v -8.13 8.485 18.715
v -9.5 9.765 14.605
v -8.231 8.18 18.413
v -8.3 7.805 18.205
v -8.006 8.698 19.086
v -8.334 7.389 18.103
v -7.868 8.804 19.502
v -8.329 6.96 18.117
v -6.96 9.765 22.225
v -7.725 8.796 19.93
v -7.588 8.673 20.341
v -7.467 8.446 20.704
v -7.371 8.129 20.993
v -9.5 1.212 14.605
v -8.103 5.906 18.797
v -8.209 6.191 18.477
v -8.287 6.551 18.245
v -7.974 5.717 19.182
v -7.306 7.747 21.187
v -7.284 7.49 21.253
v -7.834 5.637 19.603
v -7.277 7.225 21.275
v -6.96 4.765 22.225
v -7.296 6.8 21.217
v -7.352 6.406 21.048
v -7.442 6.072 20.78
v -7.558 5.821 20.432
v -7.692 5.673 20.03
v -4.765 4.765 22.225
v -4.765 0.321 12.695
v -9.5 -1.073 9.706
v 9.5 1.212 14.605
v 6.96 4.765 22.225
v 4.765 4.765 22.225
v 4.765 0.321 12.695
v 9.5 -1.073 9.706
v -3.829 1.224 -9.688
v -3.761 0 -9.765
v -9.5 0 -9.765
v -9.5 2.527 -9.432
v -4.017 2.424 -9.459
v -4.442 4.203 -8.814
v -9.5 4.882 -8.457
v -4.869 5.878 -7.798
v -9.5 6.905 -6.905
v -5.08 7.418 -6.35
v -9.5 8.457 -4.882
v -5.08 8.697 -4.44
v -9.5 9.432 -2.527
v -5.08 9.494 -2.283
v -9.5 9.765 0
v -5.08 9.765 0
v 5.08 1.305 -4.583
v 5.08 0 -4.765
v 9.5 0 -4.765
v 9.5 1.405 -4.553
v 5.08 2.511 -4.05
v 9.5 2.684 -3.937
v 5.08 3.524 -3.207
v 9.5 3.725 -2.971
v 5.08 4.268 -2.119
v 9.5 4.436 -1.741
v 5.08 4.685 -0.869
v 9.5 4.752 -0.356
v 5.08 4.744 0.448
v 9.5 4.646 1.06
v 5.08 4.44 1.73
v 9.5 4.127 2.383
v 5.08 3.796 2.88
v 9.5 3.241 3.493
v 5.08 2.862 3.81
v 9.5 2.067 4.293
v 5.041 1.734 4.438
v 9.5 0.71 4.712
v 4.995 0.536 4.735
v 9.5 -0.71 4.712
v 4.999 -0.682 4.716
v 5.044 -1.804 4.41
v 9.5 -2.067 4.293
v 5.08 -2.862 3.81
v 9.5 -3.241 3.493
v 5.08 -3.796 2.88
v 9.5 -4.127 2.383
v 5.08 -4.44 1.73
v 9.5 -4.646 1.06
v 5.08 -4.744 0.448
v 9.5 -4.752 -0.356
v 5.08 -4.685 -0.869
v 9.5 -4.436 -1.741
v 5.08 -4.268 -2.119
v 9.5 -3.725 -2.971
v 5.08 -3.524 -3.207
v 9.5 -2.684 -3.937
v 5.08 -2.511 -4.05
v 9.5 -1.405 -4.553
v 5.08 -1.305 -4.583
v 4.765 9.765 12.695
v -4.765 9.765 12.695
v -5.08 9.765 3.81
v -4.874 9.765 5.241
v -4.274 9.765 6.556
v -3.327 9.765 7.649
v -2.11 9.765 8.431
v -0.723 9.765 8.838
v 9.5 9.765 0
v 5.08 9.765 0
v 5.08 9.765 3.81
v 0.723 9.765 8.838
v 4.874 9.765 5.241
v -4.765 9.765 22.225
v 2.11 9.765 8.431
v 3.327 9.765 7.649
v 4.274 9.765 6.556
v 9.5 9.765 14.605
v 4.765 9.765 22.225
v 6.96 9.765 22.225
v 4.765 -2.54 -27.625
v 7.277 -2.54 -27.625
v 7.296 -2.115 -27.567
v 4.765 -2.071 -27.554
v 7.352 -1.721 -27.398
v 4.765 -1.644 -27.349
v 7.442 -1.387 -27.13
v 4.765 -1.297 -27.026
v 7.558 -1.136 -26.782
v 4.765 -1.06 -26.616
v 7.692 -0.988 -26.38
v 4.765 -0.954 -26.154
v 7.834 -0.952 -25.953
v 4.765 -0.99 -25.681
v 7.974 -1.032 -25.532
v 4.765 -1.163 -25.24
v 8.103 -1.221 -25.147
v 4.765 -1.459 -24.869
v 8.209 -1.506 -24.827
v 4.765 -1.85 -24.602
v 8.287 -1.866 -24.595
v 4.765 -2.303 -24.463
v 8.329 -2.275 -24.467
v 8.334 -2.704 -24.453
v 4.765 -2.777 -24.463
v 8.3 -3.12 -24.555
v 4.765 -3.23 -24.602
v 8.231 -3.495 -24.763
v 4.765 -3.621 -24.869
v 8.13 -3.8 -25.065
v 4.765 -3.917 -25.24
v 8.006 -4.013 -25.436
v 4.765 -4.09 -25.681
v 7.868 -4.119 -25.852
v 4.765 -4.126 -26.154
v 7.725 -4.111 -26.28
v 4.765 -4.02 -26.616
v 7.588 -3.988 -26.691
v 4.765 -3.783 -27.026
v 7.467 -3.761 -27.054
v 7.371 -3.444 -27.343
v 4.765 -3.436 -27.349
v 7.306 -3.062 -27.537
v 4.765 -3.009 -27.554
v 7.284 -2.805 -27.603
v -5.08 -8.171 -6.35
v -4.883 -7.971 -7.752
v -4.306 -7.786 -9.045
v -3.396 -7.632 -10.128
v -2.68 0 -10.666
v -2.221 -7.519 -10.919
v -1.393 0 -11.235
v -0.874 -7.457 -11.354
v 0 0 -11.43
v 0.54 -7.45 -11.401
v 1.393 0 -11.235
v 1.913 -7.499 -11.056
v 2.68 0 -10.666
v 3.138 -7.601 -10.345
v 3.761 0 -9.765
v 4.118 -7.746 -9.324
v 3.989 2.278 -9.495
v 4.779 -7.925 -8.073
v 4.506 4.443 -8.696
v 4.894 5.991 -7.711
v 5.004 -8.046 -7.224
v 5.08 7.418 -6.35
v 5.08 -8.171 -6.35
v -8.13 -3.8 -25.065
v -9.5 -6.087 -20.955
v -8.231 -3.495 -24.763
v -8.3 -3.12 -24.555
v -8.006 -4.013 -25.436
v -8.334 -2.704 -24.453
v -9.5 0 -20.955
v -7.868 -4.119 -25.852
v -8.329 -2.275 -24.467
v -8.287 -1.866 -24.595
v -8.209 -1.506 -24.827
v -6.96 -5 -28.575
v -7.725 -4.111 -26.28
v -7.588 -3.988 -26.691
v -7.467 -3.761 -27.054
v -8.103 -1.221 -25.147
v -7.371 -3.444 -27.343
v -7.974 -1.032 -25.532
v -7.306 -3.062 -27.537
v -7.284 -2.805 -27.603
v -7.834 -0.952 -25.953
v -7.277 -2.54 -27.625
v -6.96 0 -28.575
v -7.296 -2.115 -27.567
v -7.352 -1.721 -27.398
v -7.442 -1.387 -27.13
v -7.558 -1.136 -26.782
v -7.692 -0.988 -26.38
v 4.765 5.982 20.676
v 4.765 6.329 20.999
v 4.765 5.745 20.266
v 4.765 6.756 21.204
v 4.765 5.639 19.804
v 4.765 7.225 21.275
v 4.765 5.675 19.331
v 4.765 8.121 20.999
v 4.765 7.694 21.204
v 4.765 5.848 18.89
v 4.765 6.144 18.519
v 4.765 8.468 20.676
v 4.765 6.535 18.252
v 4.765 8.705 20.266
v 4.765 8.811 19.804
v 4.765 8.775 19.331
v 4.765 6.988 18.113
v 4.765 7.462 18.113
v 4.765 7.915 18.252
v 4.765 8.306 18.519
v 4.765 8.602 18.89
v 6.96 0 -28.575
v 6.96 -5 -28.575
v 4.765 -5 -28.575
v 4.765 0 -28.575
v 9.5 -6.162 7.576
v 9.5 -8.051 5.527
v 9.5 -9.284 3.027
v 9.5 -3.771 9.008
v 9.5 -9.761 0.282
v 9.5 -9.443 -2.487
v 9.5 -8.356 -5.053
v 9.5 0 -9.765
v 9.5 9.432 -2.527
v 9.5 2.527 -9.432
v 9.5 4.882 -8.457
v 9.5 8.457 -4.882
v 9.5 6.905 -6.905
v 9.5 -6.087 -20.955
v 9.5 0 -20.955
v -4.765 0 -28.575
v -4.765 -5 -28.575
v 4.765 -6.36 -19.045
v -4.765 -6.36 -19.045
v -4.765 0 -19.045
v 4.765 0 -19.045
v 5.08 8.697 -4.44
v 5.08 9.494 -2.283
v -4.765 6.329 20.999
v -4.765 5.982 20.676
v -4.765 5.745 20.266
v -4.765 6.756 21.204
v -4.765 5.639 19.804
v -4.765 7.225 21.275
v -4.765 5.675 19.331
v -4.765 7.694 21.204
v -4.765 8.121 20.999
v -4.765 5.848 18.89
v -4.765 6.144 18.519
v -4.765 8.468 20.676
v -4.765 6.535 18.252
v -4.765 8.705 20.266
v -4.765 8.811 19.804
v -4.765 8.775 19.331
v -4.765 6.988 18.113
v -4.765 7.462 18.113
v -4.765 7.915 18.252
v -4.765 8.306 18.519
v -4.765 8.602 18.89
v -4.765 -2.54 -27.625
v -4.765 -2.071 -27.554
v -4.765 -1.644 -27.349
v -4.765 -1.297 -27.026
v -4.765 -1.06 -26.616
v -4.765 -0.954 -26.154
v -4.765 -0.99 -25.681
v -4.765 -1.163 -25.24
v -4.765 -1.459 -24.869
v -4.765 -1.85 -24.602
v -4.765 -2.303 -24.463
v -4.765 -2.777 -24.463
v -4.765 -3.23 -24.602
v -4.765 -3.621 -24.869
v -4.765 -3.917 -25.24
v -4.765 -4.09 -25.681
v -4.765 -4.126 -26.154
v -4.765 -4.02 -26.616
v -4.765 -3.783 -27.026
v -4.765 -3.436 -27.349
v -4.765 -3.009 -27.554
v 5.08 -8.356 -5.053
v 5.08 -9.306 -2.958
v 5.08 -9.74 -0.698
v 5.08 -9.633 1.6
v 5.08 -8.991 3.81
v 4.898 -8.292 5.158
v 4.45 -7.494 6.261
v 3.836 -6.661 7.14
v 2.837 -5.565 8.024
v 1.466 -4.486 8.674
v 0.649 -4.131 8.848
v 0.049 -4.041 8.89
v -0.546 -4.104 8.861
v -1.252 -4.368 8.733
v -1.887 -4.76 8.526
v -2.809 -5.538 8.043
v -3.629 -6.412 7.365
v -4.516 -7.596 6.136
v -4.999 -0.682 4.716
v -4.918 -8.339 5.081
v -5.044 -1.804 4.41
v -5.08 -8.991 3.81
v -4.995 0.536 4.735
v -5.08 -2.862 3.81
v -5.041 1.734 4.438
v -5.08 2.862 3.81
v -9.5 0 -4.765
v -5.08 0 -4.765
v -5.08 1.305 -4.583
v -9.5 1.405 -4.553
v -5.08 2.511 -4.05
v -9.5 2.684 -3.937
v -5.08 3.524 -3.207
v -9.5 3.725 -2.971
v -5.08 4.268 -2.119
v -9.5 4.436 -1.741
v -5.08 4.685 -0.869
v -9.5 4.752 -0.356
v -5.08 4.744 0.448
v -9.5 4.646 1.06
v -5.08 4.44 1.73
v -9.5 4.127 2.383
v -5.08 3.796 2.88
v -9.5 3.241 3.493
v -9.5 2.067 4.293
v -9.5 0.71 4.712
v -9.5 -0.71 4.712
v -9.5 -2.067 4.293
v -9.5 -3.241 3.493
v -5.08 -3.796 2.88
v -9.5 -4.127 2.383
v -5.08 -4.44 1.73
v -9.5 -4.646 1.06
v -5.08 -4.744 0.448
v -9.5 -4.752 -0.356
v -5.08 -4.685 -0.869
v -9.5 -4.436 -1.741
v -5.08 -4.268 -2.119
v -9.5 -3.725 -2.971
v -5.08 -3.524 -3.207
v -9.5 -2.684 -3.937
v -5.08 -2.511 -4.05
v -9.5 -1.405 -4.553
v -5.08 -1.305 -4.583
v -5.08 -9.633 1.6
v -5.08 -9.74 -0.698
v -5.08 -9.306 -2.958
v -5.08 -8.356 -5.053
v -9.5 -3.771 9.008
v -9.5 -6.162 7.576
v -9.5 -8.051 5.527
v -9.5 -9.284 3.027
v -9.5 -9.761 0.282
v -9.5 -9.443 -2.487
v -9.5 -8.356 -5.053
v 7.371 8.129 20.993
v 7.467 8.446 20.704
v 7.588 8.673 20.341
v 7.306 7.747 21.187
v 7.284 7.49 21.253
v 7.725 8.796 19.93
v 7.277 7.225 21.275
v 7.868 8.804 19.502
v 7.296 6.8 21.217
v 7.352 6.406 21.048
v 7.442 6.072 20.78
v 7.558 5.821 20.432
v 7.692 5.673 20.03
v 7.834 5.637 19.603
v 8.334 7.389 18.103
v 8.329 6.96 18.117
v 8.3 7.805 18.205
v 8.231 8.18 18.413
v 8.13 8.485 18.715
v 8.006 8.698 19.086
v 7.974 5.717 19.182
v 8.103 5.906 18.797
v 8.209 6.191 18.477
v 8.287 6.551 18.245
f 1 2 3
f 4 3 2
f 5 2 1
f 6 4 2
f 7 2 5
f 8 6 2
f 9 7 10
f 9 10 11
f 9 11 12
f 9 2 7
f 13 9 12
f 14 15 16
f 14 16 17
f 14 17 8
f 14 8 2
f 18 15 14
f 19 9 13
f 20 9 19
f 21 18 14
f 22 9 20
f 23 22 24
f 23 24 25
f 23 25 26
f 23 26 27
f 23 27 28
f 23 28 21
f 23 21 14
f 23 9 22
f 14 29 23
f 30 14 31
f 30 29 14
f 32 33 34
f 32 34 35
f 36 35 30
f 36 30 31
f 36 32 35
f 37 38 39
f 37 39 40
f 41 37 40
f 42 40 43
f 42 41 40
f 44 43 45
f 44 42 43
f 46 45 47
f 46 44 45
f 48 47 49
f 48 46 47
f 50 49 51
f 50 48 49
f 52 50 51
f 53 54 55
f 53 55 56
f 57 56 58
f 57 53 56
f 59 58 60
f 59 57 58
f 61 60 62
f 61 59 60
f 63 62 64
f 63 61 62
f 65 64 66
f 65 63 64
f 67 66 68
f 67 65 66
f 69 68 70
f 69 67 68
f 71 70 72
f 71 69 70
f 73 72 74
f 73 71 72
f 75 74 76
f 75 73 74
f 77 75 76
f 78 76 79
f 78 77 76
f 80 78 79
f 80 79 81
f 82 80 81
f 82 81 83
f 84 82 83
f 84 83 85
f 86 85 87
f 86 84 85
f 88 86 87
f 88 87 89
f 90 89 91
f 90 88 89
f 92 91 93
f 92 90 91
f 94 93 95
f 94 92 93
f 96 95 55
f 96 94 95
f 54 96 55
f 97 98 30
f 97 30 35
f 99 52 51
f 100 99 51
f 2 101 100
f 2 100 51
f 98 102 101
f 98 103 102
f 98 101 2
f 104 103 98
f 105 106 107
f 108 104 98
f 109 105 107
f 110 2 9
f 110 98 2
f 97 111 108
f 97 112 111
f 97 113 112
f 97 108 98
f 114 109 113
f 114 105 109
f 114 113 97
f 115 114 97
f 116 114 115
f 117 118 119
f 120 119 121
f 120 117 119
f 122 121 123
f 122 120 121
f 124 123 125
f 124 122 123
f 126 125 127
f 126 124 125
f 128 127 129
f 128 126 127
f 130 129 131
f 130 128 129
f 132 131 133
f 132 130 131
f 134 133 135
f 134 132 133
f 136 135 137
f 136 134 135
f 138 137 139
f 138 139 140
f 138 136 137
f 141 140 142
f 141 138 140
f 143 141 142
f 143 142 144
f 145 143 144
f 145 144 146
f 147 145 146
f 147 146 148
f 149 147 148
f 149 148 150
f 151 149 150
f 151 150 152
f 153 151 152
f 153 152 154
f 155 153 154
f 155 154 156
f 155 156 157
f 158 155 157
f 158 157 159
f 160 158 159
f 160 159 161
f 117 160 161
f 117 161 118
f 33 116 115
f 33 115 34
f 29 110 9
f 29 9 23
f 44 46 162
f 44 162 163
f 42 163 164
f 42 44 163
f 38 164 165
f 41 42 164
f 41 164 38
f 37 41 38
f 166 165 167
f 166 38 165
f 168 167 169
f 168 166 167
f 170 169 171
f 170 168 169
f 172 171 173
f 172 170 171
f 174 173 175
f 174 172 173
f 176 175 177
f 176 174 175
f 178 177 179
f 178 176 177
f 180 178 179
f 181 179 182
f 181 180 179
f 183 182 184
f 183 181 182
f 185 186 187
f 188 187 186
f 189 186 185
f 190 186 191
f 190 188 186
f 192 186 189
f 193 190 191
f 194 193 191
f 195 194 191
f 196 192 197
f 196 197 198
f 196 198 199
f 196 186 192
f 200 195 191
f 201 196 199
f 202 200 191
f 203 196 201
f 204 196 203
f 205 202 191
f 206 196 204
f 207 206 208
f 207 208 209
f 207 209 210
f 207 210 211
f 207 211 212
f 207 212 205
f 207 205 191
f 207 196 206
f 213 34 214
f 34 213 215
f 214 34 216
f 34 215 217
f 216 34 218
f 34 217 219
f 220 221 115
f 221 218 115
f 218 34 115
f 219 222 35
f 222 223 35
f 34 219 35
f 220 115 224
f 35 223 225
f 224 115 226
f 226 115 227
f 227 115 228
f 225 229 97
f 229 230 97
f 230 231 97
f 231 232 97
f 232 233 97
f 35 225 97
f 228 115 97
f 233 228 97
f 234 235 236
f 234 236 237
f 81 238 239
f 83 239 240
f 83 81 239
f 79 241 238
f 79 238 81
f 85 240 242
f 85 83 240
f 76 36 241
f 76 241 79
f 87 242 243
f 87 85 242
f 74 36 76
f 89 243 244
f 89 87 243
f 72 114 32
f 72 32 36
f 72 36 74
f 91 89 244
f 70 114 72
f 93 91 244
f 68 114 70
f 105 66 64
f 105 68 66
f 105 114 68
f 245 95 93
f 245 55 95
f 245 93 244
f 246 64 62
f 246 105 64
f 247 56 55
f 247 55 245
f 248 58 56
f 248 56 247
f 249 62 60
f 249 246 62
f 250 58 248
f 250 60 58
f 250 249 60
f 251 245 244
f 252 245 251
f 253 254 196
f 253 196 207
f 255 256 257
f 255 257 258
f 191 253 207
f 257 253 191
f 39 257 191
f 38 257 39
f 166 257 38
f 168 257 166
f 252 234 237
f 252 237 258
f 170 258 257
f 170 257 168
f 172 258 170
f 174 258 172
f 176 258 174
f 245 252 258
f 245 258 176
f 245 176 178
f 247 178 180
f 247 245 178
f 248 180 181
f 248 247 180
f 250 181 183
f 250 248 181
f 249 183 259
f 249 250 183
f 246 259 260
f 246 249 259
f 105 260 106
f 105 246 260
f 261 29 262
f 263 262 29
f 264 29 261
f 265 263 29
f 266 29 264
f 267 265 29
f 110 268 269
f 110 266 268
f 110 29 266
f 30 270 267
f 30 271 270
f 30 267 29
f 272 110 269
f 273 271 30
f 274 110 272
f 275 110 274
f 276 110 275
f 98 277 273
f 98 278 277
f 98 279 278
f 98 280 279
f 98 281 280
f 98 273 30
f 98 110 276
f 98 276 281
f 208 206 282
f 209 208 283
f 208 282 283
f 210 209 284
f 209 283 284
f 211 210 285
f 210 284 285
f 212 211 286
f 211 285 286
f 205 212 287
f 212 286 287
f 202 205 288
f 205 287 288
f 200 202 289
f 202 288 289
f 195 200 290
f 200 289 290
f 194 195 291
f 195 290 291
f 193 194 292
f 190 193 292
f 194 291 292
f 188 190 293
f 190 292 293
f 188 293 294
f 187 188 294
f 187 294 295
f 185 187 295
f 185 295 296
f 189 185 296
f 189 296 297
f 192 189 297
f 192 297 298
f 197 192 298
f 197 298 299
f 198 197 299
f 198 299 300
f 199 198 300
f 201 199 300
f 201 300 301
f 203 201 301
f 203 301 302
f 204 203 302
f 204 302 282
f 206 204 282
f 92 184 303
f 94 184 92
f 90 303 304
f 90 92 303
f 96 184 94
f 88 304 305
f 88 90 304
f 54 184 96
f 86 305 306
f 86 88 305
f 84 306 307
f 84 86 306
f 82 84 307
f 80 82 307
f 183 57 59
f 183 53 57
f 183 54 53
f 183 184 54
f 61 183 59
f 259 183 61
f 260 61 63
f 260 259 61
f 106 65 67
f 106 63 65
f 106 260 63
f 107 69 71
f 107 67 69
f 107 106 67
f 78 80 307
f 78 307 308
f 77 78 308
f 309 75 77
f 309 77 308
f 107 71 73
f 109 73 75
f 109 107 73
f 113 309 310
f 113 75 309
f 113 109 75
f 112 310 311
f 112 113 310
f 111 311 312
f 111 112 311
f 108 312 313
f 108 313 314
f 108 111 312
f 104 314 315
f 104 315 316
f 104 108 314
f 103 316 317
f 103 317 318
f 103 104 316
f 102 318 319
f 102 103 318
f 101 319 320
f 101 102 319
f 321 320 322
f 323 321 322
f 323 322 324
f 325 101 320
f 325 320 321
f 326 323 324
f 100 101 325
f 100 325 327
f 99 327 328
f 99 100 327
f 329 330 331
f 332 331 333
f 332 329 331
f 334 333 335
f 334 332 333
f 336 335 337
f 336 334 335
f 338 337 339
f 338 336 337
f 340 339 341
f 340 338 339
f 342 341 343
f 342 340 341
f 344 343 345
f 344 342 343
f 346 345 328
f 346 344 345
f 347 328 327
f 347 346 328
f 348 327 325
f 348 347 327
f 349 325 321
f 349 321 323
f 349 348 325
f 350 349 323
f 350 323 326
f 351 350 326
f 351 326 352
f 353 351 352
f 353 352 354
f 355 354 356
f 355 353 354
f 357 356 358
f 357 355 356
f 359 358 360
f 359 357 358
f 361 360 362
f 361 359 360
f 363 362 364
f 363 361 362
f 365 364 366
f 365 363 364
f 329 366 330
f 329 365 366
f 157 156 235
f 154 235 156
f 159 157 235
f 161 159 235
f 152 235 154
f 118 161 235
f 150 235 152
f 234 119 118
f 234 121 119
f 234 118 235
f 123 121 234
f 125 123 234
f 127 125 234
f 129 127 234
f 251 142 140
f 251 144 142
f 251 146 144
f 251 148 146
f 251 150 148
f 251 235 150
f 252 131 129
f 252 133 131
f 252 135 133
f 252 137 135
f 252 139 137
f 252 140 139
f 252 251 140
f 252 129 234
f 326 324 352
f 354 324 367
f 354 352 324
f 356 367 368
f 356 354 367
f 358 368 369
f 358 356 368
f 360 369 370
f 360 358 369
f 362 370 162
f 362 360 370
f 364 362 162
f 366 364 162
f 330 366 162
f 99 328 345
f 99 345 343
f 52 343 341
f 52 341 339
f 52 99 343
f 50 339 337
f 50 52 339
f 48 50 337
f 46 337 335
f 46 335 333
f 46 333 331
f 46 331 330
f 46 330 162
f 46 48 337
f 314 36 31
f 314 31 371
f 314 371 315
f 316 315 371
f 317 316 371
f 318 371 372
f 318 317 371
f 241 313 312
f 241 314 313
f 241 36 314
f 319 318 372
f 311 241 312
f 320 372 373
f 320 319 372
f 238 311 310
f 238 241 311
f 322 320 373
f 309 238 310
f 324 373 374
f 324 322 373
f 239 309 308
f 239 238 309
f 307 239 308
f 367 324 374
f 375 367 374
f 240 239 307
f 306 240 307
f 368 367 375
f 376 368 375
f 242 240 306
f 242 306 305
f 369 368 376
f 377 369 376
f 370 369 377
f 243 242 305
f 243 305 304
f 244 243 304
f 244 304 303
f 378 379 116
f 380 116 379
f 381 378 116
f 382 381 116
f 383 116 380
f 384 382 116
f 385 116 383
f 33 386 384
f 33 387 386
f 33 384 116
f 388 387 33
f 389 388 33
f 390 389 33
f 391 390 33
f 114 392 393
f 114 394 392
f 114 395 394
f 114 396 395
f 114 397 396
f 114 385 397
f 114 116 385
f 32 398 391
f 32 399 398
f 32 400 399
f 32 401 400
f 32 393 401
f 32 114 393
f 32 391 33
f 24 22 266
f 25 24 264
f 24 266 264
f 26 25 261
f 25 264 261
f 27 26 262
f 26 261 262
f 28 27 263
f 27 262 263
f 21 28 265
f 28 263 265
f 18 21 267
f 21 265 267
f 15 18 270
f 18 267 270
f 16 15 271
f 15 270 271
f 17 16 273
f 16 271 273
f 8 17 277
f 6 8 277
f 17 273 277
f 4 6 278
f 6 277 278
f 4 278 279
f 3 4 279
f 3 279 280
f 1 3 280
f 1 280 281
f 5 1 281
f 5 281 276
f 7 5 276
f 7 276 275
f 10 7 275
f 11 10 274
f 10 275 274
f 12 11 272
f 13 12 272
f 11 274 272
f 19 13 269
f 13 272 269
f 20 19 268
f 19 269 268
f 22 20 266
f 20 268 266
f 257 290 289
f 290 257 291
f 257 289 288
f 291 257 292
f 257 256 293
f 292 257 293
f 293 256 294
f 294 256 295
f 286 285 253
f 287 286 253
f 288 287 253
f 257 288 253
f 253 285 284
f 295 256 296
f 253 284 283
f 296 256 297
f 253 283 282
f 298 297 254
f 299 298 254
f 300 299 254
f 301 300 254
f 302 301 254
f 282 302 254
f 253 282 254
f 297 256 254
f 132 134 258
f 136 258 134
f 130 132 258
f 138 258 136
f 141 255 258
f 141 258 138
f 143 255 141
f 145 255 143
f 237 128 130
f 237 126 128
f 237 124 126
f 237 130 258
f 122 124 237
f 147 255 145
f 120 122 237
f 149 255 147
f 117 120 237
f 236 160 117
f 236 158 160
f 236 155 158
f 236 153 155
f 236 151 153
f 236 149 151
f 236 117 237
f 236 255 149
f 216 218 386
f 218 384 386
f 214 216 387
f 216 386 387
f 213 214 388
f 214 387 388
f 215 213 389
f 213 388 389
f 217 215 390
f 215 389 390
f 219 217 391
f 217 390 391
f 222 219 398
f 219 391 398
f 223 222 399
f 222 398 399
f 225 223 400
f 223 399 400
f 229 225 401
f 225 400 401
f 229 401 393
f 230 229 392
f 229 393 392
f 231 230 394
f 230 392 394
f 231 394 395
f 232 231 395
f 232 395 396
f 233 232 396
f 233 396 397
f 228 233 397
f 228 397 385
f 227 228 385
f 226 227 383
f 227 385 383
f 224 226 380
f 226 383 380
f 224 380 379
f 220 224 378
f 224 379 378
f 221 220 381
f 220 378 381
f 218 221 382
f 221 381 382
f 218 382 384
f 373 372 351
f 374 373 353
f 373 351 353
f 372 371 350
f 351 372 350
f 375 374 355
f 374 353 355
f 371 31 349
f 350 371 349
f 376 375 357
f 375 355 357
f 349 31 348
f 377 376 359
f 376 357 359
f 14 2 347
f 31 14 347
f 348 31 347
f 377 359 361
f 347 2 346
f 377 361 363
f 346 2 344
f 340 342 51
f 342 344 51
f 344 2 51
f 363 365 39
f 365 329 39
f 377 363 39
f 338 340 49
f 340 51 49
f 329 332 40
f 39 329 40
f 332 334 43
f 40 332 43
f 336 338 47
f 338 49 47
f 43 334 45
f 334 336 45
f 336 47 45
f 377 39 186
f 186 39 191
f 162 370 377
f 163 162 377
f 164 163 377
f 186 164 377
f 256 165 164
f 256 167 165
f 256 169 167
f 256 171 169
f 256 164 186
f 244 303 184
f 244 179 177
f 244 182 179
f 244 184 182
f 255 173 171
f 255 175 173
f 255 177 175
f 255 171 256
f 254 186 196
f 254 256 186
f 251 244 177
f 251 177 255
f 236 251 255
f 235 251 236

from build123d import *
from OCP.BRepFilletAPI import BRepFilletAPI_MakeChamfer

# Parameters (mm, degrees)
SKETCH1_R           = 4.765
BOSS_EXTRUDE1_DEPTH = 9.5
CHAMFER1_SIZE       = 2.54
CHAMFER1_SIZE2      = 7.62
CHAMFER2_SIZE       = 7.62
CHAMFER2_SIZE2      = 2.54
CUT_EXTRUDE1_DEPTH  = 17.5
SKETCH3_W           = 9.53
SKETCH3_H           = 9.53
CUT_EXTRUDE2_DEPTH  = 17.5
SKETCH4_R           = 1.59
CUT_EXTRUDE3_DEPTH  = 17.5


with BuildPart() as part:
    # Sketch1 → Boss-Extrude1 (new, symmetric)
    with BuildSketch(Plane(origin=(0, 0, 0), x_dir=(0, 0, -1), z_dir=(1, 0, 0))):
        with BuildLine():
            Line((0, 9.765), (-22.225, 9.765))
            Line((-22.225, 9.765), (-22.225, 4.765))
            Line((-22.225, 4.765), (-9.705896356, -1.072753903))
            ThreePointArc((-9.705896356, -1.072753903), (-4.321191132, -8.756856297), (5.053224579, -8.355845041))
            Line((5.053224579, -8.355845041), (28.575, -5))
            Line((28.575, -5), (28.575, 0))
            Line((28.575, 0), (9.765, 0))
            ThreePointArc((9.765, 0), (6.904897718, 6.904897718), (0, 9.765))
        make_face()
        Circle(SKETCH1_R, mode=Mode.SUBTRACT)
    extrude(amount=BOSS_EXTRUDE1_DEPTH, both=True)

    # Chamfer1: one chamfer whose edges measure the first distance from different faces: ONE call of the kernel's chamfer builder (chamfer() names one face for all edges)
    chamfer1_edges_1 = [part.edges().sort_by_distance(p)[0] for p in [
        (9.5, 7.265, 22.225),
    ]]
    chamfer1_side_1 = [part.faces().sort_by_distance(p)[0] for p in [
        (0, 7.265, 22.225),
    ]]
    chamfer1_edges_2 = [part.edges().sort_by_distance(p)[0] for p in [
        (9.5, -2.5, -28.575),
    ]]
    chamfer1_side_2 = [part.faces().sort_by_distance(p)[0] for p in [
        (0, -2.5, -28.575),
    ]]
    chamfer1 = BRepFilletAPI_MakeChamfer(part.part.solid().wrapped)
    for e in chamfer1_edges_1:
        chamfer1.Add(CHAMFER1_SIZE, CHAMFER1_SIZE2, e.wrapped, chamfer1_side_1[0].wrapped)  # the first distance lies on this face
    for e in chamfer1_edges_2:
        chamfer1.Add(CHAMFER1_SIZE, CHAMFER1_SIZE2, e.wrapped, chamfer1_side_2[0].wrapped)  # the first distance lies on this face
    add(Compound.cast(chamfer1.Shape()), mode=Mode.REPLACE)

    # Chamfer2
    chamfer2_edges = [part.edges().sort_by_distance(p)[0] for p in [
        (-9.5, 7.265, 22.225),
        (-9.5, -2.5, -28.575),
    ]]
    chamfer2_side = [part.faces().sort_by_distance(p)[0] for p in [
        (-9.5, 9.220751812, 11.1125),
    ]]
    chamfer(chamfer2_edges, length=CHAMFER2_SIZE, length2=CHAMFER2_SIZE2, reference=chamfer2_side[0])

    # Sketch2 → Cut-Extrude1 (cut, symmetric)
    with BuildSketch(Plane(origin=(0, 0, 0), x_dir=(1, 0, 0), z_dir=(0, 1, 0))):
        with BuildLine():
            Line((-5.08, -3.81), (-5.08, 6.35))
            ThreePointArc((-5.08, 6.35), (0, 11.43), (5.08, 6.35))
            Line((5.08, 6.35), (5.08, -3.81))
            ThreePointArc((5.08, -3.81), (0, -8.89), (-5.08, -3.81))
        make_face()
    extrude(amount=CUT_EXTRUDE1_DEPTH, both=True, mode=Mode.SUBTRACT)

    # Sketch3 → Cut-Extrude2 (cut, symmetric)
    with BuildSketch(Plane(origin=(0, 0, 0), x_dir=(1, 0, 0), z_dir=(0, 1, 0))):
        with Locations((0, 23.81)):
            Rectangle(SKETCH3_W, SKETCH3_H)
        with Locations((0, -17.46)):
            Rectangle(SKETCH3_W, SKETCH3_H)
    extrude(amount=CUT_EXTRUDE2_DEPTH, both=True, mode=Mode.SUBTRACT)

    # Sketch4 → Cut-Extrude3 (cut, symmetric)
    with BuildSketch(Plane(origin=(0, 0, 0), x_dir=(0, 0, -1), z_dir=(1, 0, 0))):
        with Locations((26.035, -2.54)):
            Circle(SKETCH4_R)
        with Locations(Location((-19.685, 7.225, 0), (0, 0, 180))):
            Circle(SKETCH4_R)
    extrude(amount=CUT_EXTRUDE3_DEPTH, both=True, mode=Mode.SUBTRACT)


solid = part.part
